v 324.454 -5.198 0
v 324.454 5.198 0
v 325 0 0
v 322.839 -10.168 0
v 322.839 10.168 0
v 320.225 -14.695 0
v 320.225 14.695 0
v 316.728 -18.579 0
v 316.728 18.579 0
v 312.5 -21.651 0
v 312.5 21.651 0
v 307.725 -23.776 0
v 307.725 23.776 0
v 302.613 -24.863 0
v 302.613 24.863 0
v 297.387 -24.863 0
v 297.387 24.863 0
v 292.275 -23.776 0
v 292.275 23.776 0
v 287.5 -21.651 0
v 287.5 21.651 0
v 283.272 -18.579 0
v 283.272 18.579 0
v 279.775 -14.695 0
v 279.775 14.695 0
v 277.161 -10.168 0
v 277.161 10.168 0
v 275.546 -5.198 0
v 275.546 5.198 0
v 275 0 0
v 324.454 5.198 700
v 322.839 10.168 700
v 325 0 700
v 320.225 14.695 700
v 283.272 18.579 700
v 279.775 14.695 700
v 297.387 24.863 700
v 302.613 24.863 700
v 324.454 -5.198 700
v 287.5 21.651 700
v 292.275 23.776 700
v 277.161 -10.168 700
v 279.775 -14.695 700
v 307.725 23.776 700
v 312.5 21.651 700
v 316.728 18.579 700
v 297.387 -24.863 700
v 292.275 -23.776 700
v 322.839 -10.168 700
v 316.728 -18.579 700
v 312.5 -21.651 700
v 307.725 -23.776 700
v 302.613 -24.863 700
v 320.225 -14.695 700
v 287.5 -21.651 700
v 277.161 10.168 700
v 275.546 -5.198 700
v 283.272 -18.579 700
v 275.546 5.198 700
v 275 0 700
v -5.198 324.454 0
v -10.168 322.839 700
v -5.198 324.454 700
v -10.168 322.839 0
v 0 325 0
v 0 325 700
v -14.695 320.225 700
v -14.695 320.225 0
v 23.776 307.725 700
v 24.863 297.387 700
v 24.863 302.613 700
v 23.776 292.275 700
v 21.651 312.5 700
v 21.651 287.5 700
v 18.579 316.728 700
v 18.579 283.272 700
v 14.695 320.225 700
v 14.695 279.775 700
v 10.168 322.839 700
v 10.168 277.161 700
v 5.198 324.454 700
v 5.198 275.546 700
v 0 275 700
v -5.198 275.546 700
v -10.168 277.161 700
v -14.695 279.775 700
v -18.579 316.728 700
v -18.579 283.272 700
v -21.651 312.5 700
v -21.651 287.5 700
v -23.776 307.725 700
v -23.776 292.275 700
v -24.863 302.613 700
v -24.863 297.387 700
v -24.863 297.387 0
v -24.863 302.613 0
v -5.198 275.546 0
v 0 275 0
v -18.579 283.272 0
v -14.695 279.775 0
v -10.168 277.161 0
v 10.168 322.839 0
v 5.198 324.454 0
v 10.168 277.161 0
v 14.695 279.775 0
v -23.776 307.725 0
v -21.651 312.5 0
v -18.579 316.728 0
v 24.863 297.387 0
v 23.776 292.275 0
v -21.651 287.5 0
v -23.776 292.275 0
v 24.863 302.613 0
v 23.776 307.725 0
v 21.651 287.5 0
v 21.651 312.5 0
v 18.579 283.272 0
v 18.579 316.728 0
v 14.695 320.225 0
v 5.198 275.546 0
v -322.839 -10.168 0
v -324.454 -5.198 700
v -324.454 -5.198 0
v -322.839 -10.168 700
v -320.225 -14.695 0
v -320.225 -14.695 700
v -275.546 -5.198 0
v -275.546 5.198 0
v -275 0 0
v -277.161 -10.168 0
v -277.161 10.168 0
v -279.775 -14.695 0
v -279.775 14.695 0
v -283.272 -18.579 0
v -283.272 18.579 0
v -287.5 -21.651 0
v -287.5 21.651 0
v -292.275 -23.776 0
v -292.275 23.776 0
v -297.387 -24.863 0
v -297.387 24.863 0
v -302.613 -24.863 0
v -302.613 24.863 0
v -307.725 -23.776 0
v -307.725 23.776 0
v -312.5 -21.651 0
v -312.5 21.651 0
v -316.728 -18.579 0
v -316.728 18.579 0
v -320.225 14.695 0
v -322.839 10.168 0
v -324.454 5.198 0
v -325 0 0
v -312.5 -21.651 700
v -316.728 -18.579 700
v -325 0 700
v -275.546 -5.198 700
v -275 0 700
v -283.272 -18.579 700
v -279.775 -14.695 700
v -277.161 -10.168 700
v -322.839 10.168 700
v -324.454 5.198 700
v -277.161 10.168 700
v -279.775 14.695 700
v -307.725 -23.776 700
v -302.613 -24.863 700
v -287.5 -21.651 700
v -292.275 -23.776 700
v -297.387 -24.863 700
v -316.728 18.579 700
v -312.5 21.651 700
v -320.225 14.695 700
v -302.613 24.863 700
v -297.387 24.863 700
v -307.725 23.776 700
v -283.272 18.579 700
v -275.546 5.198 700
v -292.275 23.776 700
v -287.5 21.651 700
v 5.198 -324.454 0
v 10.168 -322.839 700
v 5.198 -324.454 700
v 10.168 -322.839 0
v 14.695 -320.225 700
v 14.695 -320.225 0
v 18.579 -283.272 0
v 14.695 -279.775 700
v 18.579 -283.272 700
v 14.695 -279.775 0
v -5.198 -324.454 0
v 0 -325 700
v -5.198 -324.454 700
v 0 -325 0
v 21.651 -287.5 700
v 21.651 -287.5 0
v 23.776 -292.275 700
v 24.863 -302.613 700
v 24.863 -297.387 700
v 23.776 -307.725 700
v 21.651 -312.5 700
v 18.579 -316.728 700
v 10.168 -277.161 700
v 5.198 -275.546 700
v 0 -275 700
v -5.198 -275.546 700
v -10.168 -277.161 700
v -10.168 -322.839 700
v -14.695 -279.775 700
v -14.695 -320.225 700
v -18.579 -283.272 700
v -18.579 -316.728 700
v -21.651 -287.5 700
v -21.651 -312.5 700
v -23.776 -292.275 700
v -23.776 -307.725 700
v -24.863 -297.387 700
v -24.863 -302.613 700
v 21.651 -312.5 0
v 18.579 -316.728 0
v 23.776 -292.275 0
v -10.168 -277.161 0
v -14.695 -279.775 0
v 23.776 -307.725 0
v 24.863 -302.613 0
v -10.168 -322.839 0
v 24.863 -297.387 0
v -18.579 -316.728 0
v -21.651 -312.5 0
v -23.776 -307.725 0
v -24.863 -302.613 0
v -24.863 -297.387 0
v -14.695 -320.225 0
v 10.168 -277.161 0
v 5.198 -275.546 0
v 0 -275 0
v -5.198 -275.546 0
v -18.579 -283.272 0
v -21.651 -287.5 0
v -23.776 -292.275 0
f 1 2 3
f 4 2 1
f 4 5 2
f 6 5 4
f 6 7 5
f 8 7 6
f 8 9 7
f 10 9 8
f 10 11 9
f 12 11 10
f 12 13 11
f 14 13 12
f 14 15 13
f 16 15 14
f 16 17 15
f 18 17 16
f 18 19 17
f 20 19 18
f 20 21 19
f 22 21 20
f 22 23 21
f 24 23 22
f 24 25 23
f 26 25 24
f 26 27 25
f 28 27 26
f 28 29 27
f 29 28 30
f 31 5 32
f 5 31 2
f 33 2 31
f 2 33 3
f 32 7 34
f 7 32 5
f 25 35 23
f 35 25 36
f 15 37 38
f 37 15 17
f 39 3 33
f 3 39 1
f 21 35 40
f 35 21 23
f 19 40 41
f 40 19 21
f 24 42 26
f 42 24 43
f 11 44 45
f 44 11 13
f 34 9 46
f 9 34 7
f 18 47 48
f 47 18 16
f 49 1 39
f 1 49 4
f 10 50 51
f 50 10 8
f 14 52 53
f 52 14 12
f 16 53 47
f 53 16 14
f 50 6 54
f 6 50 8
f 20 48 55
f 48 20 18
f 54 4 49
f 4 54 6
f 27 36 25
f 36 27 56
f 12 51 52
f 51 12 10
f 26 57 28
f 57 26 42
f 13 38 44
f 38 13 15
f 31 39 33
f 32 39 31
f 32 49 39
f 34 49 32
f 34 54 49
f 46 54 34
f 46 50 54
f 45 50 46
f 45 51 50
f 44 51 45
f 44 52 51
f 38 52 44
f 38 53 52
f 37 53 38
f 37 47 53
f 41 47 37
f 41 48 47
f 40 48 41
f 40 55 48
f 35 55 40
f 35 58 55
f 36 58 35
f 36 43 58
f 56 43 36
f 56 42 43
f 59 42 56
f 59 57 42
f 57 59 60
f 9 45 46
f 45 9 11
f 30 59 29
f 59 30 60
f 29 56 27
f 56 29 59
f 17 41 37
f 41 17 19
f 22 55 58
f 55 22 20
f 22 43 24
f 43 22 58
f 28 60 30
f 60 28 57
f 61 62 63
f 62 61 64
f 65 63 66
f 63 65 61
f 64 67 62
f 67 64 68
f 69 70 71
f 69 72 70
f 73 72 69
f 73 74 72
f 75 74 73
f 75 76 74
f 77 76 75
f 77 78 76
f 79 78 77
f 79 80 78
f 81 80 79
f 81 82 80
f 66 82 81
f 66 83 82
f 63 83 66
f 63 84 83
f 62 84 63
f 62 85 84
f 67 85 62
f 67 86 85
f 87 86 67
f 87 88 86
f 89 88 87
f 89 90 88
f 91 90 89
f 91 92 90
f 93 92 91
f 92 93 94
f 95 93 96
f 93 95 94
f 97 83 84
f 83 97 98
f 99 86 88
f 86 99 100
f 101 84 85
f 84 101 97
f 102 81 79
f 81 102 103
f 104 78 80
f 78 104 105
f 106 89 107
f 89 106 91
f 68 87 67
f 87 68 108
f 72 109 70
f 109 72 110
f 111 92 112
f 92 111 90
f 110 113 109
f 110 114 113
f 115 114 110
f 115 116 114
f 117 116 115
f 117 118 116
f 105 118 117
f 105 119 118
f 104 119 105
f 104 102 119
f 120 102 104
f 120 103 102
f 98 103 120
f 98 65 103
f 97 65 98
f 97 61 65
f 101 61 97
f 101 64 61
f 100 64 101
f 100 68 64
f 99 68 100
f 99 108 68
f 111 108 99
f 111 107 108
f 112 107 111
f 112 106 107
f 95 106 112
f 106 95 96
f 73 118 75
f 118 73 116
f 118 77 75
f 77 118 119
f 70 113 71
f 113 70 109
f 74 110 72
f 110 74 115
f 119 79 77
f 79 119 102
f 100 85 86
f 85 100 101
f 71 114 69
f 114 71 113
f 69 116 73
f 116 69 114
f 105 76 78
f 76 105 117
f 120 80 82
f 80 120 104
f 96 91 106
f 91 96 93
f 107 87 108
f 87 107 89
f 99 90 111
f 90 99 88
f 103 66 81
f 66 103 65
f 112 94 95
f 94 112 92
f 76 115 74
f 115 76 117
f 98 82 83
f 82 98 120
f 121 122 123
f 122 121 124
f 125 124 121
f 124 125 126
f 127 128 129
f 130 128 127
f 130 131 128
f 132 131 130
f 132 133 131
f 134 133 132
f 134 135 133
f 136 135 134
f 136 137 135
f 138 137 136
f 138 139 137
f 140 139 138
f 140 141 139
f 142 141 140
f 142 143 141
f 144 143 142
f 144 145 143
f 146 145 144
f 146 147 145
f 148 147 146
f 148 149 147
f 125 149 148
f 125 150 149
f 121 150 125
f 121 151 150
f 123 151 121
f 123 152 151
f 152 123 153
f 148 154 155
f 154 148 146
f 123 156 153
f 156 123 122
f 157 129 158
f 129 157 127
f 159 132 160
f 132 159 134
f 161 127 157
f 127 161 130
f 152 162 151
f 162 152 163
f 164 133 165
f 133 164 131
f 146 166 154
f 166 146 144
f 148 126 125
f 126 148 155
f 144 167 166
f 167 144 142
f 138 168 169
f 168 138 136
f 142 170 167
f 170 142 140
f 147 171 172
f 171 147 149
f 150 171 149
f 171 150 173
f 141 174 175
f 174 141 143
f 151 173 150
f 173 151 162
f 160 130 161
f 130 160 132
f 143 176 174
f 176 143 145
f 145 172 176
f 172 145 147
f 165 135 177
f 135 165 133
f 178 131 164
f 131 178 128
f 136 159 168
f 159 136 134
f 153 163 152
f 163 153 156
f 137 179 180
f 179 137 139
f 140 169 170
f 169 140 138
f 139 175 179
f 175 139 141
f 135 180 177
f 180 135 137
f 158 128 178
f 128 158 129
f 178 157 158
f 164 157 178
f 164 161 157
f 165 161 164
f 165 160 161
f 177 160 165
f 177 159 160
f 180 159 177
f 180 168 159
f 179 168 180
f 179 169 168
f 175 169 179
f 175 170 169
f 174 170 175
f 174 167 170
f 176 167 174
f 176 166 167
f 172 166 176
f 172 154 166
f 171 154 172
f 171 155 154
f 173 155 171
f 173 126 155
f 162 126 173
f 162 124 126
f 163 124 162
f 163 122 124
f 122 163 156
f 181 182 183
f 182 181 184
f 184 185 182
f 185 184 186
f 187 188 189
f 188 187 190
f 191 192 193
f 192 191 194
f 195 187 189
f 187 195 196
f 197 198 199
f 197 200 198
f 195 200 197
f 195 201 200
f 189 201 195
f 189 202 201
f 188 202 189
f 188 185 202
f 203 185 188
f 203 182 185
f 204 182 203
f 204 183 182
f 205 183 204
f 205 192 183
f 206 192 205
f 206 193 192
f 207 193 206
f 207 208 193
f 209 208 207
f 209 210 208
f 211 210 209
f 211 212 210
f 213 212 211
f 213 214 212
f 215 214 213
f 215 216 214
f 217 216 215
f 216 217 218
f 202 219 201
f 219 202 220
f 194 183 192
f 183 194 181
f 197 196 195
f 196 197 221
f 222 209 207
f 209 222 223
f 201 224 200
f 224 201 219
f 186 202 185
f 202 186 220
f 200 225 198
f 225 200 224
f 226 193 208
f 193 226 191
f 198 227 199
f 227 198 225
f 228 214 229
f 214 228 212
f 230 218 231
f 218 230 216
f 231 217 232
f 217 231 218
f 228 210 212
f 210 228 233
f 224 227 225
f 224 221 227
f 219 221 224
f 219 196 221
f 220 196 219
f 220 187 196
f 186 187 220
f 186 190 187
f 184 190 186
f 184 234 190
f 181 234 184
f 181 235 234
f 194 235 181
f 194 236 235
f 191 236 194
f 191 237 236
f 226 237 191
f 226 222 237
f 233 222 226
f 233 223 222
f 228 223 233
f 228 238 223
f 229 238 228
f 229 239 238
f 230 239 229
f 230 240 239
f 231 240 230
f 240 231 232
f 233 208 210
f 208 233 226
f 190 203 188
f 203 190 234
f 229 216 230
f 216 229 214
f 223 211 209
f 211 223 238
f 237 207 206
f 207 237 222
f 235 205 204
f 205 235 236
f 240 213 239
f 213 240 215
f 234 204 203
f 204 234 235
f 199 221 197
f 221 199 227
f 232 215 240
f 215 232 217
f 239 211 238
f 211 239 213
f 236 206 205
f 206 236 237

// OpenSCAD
// Tample of Heaven

for( i = [0 : 360 / 4 : 360 / 4 * 3] ){
    rotate([0,0,i]) {
        translate([300,0,0])
        color([185/255,140/255,119/255])
        cylinder(700,25,25);
    }
}
